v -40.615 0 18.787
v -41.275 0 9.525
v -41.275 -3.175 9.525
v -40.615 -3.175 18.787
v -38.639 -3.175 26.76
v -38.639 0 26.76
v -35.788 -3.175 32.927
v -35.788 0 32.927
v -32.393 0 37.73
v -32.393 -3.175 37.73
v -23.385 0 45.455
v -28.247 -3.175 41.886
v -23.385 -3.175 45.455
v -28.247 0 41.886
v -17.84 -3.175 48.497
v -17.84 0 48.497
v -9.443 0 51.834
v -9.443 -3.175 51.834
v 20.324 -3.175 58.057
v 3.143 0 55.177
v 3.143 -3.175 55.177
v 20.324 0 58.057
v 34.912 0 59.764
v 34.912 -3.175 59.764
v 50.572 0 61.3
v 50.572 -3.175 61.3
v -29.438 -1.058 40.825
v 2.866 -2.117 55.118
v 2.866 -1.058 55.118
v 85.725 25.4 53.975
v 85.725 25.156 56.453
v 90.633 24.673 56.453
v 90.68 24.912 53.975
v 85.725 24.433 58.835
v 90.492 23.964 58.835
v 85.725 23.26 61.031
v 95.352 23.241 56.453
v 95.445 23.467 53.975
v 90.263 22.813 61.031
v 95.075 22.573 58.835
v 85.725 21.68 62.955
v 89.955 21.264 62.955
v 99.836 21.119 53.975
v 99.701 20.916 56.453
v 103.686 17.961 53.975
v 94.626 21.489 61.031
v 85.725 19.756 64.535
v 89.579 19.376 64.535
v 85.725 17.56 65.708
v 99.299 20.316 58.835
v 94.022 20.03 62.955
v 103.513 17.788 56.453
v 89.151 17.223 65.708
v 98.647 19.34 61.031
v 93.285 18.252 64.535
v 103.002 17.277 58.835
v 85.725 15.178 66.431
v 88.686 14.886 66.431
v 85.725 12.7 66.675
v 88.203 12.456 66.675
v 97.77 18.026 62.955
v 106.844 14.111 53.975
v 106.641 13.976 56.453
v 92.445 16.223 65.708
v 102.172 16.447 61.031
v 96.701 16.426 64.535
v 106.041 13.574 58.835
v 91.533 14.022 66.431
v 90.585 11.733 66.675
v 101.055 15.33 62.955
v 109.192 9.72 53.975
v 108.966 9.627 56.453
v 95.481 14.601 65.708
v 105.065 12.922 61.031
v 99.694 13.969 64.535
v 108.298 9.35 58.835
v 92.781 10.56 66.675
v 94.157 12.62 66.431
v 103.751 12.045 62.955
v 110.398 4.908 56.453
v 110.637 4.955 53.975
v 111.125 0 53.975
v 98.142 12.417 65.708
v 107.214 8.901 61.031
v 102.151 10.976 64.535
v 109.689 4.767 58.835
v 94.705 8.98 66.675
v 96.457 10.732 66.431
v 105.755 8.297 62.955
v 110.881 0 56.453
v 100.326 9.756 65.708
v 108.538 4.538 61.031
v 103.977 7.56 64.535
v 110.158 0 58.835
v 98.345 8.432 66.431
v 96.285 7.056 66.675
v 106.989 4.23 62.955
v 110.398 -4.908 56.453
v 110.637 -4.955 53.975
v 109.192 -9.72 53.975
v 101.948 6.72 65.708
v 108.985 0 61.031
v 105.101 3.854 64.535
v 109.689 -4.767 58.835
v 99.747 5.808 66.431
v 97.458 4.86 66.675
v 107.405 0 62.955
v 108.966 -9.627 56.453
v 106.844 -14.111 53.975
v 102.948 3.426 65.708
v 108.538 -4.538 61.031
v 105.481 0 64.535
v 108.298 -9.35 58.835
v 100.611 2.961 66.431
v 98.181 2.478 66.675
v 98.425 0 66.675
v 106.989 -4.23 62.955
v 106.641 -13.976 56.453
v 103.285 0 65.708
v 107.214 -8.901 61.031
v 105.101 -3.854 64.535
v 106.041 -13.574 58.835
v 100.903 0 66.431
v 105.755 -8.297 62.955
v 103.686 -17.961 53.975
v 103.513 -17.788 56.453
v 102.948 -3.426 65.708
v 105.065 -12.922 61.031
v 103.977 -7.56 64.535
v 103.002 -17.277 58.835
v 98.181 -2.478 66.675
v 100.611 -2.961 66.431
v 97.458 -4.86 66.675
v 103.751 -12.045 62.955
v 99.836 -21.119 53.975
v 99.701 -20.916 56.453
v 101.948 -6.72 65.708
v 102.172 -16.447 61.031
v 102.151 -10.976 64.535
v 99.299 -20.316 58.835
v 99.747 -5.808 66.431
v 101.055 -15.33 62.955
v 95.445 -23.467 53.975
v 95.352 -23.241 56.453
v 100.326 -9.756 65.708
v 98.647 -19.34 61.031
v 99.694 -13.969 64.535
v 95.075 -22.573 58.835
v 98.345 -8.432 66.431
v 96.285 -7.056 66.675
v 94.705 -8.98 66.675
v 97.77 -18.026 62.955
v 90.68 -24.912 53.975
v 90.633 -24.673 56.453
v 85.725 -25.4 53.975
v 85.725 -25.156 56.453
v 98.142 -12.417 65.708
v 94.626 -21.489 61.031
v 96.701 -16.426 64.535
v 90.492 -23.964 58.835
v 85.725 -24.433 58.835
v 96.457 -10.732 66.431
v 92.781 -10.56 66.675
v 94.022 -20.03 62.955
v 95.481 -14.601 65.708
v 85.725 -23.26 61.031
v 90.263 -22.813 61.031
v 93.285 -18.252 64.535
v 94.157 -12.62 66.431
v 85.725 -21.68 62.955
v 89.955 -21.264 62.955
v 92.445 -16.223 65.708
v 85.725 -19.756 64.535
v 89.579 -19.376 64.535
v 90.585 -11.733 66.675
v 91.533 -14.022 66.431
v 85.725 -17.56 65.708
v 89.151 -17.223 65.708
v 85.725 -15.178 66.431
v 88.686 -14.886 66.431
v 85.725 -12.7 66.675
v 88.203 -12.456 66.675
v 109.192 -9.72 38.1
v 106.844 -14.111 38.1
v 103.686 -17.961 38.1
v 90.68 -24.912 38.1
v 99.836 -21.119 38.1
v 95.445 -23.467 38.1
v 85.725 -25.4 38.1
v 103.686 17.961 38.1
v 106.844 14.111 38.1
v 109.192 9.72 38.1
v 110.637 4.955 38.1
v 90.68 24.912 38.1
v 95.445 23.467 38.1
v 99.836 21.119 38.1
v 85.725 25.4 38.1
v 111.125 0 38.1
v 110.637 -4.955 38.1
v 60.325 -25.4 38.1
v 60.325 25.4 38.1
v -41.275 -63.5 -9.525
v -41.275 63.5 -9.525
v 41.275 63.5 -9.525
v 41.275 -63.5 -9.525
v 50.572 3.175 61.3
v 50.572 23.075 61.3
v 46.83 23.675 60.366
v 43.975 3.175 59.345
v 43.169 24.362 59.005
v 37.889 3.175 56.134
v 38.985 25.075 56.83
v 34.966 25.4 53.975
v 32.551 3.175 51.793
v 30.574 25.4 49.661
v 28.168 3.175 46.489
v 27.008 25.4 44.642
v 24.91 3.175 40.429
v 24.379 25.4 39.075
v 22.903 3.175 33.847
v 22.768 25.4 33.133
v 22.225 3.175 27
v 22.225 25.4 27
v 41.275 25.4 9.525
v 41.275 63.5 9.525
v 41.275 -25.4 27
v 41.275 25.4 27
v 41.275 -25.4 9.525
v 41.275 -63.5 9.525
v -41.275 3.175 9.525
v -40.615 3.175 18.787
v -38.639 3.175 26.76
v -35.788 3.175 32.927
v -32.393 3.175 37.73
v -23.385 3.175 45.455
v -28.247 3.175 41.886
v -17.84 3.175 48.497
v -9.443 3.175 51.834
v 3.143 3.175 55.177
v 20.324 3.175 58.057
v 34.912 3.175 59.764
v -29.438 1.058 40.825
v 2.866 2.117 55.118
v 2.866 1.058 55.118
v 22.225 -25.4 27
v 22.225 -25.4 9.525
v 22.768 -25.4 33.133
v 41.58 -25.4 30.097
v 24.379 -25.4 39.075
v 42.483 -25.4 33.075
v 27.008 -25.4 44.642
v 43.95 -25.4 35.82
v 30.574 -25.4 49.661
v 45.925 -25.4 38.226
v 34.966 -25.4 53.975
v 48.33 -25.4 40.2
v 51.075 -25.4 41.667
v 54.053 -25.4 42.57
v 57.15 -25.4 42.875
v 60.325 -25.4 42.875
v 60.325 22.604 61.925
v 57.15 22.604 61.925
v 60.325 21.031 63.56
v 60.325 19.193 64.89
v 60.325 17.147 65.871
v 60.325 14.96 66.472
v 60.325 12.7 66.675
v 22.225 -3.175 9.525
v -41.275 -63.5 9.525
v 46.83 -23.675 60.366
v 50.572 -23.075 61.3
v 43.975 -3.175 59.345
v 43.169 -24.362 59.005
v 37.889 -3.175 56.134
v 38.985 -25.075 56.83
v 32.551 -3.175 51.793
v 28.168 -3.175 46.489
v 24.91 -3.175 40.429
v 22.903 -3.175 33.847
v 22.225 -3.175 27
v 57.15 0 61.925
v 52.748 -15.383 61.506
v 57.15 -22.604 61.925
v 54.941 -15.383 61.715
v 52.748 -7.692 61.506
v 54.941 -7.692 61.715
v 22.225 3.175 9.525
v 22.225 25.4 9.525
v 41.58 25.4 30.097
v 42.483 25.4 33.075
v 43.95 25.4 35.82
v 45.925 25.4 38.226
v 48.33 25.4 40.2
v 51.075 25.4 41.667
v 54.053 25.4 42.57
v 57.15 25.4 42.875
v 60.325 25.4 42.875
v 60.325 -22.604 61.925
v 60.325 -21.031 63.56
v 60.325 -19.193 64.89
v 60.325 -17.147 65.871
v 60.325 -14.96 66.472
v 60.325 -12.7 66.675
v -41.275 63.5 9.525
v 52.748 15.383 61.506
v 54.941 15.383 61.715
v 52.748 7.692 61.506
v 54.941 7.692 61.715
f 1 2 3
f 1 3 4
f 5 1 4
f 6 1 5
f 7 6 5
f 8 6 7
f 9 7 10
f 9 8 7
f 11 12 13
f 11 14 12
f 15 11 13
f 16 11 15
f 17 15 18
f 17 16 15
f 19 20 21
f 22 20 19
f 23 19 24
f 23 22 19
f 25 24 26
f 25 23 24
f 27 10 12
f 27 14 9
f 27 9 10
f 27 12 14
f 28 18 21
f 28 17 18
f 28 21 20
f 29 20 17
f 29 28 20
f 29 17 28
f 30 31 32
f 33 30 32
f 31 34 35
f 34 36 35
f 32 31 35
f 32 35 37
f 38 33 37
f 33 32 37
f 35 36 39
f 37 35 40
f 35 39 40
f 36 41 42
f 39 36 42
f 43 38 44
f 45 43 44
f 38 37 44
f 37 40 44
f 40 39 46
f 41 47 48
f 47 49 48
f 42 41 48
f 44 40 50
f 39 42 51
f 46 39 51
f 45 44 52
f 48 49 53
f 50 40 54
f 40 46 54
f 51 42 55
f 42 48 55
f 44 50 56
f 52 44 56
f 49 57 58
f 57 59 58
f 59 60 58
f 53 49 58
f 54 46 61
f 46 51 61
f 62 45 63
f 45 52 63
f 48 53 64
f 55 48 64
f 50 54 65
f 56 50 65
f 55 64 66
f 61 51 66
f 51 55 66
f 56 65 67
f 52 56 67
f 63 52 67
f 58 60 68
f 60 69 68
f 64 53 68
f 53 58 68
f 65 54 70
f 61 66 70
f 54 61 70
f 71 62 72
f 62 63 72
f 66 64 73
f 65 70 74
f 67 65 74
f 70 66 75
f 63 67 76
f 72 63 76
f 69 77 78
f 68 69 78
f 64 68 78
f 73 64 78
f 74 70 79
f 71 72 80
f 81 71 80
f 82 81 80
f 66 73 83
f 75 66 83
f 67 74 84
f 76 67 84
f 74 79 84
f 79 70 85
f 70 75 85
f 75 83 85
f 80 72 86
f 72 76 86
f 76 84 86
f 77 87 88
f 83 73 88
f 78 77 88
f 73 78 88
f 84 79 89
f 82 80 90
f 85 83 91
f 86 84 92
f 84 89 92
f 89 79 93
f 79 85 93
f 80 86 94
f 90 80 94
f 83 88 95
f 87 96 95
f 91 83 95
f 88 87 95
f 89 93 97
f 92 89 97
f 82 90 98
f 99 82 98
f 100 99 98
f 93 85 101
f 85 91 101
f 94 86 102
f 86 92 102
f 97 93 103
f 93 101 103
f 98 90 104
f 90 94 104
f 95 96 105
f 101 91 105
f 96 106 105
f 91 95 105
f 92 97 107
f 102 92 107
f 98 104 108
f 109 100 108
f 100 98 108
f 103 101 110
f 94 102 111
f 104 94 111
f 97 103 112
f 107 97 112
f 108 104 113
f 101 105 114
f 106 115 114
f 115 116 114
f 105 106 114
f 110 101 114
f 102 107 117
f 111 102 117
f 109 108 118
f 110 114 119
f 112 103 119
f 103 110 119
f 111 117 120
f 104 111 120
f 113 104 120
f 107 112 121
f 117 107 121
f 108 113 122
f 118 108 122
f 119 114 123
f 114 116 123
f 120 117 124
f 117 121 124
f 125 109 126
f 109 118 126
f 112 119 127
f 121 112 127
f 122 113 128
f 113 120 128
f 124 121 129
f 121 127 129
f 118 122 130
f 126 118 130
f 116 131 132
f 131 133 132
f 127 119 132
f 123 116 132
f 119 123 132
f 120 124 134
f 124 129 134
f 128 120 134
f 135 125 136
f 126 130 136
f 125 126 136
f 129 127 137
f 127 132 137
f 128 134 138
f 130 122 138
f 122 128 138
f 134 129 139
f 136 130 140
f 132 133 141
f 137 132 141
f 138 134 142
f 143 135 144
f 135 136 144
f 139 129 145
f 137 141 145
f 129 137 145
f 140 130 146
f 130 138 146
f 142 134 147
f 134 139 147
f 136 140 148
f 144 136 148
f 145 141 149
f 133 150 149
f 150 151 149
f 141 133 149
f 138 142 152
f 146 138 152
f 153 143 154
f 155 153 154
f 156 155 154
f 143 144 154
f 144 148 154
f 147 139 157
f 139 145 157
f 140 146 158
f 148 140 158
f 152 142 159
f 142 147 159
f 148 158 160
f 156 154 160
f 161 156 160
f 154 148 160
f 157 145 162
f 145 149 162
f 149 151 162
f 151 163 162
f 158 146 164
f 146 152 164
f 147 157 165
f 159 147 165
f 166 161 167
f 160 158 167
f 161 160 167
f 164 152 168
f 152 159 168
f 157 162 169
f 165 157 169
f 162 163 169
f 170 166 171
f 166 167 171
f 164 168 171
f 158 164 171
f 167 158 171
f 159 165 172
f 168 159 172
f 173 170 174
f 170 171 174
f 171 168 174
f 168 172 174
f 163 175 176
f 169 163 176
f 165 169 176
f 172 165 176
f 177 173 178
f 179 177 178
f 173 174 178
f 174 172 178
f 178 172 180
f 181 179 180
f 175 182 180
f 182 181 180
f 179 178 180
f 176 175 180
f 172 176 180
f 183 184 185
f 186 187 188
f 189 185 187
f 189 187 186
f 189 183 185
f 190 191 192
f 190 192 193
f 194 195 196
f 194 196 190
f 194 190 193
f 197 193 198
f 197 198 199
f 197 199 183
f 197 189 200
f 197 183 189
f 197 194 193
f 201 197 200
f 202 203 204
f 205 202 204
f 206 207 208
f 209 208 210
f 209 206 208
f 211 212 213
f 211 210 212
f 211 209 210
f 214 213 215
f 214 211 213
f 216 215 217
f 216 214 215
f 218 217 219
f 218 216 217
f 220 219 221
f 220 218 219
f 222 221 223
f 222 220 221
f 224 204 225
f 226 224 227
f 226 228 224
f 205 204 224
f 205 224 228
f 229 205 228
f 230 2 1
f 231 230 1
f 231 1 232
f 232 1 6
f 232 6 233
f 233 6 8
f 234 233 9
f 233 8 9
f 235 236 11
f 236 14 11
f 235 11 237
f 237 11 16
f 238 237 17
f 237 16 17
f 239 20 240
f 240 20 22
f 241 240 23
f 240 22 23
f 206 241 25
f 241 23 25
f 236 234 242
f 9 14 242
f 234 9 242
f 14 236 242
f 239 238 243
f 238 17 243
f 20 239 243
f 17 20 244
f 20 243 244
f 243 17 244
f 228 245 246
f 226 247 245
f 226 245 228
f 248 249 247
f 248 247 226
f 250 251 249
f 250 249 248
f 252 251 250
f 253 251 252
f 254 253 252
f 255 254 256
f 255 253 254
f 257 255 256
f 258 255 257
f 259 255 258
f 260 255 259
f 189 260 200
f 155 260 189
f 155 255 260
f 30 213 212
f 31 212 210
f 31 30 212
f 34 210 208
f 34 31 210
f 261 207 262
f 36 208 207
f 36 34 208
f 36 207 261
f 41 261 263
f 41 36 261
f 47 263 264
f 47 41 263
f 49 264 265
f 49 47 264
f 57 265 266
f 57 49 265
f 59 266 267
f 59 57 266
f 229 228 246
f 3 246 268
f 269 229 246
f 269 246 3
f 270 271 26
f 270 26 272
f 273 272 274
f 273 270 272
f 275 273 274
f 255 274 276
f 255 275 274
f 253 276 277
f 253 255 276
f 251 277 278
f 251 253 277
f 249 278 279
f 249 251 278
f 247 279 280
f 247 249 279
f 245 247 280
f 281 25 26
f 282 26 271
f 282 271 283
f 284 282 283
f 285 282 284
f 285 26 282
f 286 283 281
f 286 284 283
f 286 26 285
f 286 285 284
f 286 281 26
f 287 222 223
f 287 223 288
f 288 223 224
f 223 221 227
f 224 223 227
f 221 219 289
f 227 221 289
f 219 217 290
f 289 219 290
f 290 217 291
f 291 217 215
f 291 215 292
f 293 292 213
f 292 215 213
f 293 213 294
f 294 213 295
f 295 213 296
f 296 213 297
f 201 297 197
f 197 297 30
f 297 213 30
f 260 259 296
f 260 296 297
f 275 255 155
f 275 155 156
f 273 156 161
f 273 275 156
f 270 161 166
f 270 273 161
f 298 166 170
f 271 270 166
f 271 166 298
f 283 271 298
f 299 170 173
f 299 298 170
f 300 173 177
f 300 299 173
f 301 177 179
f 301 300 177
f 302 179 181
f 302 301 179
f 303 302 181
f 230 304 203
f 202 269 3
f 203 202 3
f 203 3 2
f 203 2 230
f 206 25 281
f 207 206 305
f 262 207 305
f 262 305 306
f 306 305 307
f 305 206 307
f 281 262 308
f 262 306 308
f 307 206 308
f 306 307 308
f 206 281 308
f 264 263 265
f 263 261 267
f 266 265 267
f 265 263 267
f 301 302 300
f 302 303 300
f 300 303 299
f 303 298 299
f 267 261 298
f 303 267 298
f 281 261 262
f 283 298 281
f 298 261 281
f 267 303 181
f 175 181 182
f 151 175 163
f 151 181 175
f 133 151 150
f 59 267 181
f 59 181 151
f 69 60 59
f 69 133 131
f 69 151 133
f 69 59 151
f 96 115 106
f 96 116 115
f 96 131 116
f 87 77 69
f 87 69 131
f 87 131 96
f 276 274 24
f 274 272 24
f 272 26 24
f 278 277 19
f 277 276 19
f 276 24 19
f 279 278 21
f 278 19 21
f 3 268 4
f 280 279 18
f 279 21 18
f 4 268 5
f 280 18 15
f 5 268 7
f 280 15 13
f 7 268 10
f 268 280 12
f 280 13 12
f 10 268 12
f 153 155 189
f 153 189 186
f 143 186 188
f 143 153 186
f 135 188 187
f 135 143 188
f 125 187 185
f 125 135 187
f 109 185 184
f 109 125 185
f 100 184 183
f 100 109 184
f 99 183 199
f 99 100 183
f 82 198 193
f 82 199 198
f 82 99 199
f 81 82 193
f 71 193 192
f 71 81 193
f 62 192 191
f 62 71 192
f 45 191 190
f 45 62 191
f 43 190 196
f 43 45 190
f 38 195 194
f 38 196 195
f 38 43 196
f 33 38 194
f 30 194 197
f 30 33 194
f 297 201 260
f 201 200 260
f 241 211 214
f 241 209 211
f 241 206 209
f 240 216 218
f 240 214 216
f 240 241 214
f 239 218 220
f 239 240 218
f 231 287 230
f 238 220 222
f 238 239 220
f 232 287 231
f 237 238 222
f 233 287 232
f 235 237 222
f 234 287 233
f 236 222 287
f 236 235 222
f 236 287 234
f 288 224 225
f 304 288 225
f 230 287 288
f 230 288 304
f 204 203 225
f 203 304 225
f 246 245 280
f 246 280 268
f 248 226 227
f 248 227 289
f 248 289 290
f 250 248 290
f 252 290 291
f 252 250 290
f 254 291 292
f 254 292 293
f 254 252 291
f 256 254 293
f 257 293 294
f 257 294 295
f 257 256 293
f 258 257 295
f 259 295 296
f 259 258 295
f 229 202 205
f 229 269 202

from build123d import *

# Parameters (mm, degrees)
F1_DEPTH = 63.5
F0_W     = 25.4
F0_H     = 19.05
F0_H_2   = 4.7498
F0_H_3   = 4.7752
F2_DEPTH = 25.4
F4_DEPTH = 3.175
F5_R     = 12.7


with BuildPart() as f1:
    # F0 (on Front) → F1 (new body, symmetric)
    with BuildSketch(Plane.XZ):
        Polygon((-41.275, -9.525), (41.275, -9.525), (41.275, 9.525), (22.225, 9.525), (-41.275, 9.525), align=None)
    extrude(amount=F1_DEPTH, both=True)

    # F0 (on Front) → F2 (join, symmetric)
    with BuildSketch(Plane.XZ):
        with BuildLine():
            Line((22.225, 9.525), (41.275, 9.525))
            Line((41.275, 9.525), (41.275, 27.0002))
            ThreePointArc((41.275, 27.0002), (45.9246798487, 38.2255201513), (57.15, 42.8752))
            Line((57.15, 42.8752), (60.325, 42.8752))
            Line((60.325, 42.8752), (60.325, 61.9252))
            Line((60.325, 61.9252), (57.15, 61.9252))
            add(Edge.make_bspline(
                [(50.5716827733, 61.3000741611), (52.7396972635, 61.5056461021), (54.9329690535, 61.7131439678), (57.15, 61.9252)],
                knots=[107.178919237, 107.178919237, 107.178919237, 107.178919237, 111.5045361635, 111.5045361635, 111.5045361635, 111.5045361635], degree=3))
            ThreePointArc((50.5716827733, 61.3000741611), (30.2287876003, 49.2488841842), (22.225, 27.0002))
            Line((22.225, 27.0002), (22.225, 9.525))
        make_face()
        with Locations((73.025, 52.4002)):
            Rectangle(F0_W, F0_H)
        with Locations((73.025, 64.3001)):
            Rectangle(F0_W, F0_H_2)
        with Locations((73.025, 40.4876)):
            Rectangle(F0_W, F0_H_3)
    extrude(amount=F2_DEPTH, both=True)

    # F0 (on Front) → F3 (revolve)
    with BuildSketch(Plane.XZ):
        Polygon((85.725, 61.9252), (85.725, 42.8752), (85.725, 38.1), (111.125, 38.1), (111.125, 66.675), (85.725, 66.675), align=None)
    revolve(axis=Axis((85.725, 0, 52.3875), (0, 0, 1)))

    # F0 (on Front) → F4 (join, symmetric)
    with BuildSketch(Plane.XZ):
        with BuildLine():
            add(Edge.make_bspline(
                [(-41.275, 9.525), (-41.358874461, 52.2952599857), (-3.1467703164, 56.2064704424), (50.5716827733, 61.3000741611)],
                knots=[0, 0, 0, 0, 107.178919237, 107.178919237, 107.178919237, 107.178919237], degree=3))
            Line((-41.275, 9.525), (22.225, 9.525))
            Line((22.225, 9.525), (22.225, 27.0002))
            ThreePointArc((22.225, 27.0002), (30.2287876003, 49.2488841842), (50.5716827733, 61.3000741611))
        make_face()
    extrude(amount=F4_DEPTH, both=True)

    # F5
    f5_edges = [f1.edges().sort_by_distance(p)[0] for p in [
        (85.725, 25.4, 52.3875),
        (73.025, 25.4, 66.675),
        (73.025, -25.4, 66.675),
        (111.125, 0, 66.675),
    ]]
    fillet(f5_edges, radius=F5_R)


solid = f1.part
